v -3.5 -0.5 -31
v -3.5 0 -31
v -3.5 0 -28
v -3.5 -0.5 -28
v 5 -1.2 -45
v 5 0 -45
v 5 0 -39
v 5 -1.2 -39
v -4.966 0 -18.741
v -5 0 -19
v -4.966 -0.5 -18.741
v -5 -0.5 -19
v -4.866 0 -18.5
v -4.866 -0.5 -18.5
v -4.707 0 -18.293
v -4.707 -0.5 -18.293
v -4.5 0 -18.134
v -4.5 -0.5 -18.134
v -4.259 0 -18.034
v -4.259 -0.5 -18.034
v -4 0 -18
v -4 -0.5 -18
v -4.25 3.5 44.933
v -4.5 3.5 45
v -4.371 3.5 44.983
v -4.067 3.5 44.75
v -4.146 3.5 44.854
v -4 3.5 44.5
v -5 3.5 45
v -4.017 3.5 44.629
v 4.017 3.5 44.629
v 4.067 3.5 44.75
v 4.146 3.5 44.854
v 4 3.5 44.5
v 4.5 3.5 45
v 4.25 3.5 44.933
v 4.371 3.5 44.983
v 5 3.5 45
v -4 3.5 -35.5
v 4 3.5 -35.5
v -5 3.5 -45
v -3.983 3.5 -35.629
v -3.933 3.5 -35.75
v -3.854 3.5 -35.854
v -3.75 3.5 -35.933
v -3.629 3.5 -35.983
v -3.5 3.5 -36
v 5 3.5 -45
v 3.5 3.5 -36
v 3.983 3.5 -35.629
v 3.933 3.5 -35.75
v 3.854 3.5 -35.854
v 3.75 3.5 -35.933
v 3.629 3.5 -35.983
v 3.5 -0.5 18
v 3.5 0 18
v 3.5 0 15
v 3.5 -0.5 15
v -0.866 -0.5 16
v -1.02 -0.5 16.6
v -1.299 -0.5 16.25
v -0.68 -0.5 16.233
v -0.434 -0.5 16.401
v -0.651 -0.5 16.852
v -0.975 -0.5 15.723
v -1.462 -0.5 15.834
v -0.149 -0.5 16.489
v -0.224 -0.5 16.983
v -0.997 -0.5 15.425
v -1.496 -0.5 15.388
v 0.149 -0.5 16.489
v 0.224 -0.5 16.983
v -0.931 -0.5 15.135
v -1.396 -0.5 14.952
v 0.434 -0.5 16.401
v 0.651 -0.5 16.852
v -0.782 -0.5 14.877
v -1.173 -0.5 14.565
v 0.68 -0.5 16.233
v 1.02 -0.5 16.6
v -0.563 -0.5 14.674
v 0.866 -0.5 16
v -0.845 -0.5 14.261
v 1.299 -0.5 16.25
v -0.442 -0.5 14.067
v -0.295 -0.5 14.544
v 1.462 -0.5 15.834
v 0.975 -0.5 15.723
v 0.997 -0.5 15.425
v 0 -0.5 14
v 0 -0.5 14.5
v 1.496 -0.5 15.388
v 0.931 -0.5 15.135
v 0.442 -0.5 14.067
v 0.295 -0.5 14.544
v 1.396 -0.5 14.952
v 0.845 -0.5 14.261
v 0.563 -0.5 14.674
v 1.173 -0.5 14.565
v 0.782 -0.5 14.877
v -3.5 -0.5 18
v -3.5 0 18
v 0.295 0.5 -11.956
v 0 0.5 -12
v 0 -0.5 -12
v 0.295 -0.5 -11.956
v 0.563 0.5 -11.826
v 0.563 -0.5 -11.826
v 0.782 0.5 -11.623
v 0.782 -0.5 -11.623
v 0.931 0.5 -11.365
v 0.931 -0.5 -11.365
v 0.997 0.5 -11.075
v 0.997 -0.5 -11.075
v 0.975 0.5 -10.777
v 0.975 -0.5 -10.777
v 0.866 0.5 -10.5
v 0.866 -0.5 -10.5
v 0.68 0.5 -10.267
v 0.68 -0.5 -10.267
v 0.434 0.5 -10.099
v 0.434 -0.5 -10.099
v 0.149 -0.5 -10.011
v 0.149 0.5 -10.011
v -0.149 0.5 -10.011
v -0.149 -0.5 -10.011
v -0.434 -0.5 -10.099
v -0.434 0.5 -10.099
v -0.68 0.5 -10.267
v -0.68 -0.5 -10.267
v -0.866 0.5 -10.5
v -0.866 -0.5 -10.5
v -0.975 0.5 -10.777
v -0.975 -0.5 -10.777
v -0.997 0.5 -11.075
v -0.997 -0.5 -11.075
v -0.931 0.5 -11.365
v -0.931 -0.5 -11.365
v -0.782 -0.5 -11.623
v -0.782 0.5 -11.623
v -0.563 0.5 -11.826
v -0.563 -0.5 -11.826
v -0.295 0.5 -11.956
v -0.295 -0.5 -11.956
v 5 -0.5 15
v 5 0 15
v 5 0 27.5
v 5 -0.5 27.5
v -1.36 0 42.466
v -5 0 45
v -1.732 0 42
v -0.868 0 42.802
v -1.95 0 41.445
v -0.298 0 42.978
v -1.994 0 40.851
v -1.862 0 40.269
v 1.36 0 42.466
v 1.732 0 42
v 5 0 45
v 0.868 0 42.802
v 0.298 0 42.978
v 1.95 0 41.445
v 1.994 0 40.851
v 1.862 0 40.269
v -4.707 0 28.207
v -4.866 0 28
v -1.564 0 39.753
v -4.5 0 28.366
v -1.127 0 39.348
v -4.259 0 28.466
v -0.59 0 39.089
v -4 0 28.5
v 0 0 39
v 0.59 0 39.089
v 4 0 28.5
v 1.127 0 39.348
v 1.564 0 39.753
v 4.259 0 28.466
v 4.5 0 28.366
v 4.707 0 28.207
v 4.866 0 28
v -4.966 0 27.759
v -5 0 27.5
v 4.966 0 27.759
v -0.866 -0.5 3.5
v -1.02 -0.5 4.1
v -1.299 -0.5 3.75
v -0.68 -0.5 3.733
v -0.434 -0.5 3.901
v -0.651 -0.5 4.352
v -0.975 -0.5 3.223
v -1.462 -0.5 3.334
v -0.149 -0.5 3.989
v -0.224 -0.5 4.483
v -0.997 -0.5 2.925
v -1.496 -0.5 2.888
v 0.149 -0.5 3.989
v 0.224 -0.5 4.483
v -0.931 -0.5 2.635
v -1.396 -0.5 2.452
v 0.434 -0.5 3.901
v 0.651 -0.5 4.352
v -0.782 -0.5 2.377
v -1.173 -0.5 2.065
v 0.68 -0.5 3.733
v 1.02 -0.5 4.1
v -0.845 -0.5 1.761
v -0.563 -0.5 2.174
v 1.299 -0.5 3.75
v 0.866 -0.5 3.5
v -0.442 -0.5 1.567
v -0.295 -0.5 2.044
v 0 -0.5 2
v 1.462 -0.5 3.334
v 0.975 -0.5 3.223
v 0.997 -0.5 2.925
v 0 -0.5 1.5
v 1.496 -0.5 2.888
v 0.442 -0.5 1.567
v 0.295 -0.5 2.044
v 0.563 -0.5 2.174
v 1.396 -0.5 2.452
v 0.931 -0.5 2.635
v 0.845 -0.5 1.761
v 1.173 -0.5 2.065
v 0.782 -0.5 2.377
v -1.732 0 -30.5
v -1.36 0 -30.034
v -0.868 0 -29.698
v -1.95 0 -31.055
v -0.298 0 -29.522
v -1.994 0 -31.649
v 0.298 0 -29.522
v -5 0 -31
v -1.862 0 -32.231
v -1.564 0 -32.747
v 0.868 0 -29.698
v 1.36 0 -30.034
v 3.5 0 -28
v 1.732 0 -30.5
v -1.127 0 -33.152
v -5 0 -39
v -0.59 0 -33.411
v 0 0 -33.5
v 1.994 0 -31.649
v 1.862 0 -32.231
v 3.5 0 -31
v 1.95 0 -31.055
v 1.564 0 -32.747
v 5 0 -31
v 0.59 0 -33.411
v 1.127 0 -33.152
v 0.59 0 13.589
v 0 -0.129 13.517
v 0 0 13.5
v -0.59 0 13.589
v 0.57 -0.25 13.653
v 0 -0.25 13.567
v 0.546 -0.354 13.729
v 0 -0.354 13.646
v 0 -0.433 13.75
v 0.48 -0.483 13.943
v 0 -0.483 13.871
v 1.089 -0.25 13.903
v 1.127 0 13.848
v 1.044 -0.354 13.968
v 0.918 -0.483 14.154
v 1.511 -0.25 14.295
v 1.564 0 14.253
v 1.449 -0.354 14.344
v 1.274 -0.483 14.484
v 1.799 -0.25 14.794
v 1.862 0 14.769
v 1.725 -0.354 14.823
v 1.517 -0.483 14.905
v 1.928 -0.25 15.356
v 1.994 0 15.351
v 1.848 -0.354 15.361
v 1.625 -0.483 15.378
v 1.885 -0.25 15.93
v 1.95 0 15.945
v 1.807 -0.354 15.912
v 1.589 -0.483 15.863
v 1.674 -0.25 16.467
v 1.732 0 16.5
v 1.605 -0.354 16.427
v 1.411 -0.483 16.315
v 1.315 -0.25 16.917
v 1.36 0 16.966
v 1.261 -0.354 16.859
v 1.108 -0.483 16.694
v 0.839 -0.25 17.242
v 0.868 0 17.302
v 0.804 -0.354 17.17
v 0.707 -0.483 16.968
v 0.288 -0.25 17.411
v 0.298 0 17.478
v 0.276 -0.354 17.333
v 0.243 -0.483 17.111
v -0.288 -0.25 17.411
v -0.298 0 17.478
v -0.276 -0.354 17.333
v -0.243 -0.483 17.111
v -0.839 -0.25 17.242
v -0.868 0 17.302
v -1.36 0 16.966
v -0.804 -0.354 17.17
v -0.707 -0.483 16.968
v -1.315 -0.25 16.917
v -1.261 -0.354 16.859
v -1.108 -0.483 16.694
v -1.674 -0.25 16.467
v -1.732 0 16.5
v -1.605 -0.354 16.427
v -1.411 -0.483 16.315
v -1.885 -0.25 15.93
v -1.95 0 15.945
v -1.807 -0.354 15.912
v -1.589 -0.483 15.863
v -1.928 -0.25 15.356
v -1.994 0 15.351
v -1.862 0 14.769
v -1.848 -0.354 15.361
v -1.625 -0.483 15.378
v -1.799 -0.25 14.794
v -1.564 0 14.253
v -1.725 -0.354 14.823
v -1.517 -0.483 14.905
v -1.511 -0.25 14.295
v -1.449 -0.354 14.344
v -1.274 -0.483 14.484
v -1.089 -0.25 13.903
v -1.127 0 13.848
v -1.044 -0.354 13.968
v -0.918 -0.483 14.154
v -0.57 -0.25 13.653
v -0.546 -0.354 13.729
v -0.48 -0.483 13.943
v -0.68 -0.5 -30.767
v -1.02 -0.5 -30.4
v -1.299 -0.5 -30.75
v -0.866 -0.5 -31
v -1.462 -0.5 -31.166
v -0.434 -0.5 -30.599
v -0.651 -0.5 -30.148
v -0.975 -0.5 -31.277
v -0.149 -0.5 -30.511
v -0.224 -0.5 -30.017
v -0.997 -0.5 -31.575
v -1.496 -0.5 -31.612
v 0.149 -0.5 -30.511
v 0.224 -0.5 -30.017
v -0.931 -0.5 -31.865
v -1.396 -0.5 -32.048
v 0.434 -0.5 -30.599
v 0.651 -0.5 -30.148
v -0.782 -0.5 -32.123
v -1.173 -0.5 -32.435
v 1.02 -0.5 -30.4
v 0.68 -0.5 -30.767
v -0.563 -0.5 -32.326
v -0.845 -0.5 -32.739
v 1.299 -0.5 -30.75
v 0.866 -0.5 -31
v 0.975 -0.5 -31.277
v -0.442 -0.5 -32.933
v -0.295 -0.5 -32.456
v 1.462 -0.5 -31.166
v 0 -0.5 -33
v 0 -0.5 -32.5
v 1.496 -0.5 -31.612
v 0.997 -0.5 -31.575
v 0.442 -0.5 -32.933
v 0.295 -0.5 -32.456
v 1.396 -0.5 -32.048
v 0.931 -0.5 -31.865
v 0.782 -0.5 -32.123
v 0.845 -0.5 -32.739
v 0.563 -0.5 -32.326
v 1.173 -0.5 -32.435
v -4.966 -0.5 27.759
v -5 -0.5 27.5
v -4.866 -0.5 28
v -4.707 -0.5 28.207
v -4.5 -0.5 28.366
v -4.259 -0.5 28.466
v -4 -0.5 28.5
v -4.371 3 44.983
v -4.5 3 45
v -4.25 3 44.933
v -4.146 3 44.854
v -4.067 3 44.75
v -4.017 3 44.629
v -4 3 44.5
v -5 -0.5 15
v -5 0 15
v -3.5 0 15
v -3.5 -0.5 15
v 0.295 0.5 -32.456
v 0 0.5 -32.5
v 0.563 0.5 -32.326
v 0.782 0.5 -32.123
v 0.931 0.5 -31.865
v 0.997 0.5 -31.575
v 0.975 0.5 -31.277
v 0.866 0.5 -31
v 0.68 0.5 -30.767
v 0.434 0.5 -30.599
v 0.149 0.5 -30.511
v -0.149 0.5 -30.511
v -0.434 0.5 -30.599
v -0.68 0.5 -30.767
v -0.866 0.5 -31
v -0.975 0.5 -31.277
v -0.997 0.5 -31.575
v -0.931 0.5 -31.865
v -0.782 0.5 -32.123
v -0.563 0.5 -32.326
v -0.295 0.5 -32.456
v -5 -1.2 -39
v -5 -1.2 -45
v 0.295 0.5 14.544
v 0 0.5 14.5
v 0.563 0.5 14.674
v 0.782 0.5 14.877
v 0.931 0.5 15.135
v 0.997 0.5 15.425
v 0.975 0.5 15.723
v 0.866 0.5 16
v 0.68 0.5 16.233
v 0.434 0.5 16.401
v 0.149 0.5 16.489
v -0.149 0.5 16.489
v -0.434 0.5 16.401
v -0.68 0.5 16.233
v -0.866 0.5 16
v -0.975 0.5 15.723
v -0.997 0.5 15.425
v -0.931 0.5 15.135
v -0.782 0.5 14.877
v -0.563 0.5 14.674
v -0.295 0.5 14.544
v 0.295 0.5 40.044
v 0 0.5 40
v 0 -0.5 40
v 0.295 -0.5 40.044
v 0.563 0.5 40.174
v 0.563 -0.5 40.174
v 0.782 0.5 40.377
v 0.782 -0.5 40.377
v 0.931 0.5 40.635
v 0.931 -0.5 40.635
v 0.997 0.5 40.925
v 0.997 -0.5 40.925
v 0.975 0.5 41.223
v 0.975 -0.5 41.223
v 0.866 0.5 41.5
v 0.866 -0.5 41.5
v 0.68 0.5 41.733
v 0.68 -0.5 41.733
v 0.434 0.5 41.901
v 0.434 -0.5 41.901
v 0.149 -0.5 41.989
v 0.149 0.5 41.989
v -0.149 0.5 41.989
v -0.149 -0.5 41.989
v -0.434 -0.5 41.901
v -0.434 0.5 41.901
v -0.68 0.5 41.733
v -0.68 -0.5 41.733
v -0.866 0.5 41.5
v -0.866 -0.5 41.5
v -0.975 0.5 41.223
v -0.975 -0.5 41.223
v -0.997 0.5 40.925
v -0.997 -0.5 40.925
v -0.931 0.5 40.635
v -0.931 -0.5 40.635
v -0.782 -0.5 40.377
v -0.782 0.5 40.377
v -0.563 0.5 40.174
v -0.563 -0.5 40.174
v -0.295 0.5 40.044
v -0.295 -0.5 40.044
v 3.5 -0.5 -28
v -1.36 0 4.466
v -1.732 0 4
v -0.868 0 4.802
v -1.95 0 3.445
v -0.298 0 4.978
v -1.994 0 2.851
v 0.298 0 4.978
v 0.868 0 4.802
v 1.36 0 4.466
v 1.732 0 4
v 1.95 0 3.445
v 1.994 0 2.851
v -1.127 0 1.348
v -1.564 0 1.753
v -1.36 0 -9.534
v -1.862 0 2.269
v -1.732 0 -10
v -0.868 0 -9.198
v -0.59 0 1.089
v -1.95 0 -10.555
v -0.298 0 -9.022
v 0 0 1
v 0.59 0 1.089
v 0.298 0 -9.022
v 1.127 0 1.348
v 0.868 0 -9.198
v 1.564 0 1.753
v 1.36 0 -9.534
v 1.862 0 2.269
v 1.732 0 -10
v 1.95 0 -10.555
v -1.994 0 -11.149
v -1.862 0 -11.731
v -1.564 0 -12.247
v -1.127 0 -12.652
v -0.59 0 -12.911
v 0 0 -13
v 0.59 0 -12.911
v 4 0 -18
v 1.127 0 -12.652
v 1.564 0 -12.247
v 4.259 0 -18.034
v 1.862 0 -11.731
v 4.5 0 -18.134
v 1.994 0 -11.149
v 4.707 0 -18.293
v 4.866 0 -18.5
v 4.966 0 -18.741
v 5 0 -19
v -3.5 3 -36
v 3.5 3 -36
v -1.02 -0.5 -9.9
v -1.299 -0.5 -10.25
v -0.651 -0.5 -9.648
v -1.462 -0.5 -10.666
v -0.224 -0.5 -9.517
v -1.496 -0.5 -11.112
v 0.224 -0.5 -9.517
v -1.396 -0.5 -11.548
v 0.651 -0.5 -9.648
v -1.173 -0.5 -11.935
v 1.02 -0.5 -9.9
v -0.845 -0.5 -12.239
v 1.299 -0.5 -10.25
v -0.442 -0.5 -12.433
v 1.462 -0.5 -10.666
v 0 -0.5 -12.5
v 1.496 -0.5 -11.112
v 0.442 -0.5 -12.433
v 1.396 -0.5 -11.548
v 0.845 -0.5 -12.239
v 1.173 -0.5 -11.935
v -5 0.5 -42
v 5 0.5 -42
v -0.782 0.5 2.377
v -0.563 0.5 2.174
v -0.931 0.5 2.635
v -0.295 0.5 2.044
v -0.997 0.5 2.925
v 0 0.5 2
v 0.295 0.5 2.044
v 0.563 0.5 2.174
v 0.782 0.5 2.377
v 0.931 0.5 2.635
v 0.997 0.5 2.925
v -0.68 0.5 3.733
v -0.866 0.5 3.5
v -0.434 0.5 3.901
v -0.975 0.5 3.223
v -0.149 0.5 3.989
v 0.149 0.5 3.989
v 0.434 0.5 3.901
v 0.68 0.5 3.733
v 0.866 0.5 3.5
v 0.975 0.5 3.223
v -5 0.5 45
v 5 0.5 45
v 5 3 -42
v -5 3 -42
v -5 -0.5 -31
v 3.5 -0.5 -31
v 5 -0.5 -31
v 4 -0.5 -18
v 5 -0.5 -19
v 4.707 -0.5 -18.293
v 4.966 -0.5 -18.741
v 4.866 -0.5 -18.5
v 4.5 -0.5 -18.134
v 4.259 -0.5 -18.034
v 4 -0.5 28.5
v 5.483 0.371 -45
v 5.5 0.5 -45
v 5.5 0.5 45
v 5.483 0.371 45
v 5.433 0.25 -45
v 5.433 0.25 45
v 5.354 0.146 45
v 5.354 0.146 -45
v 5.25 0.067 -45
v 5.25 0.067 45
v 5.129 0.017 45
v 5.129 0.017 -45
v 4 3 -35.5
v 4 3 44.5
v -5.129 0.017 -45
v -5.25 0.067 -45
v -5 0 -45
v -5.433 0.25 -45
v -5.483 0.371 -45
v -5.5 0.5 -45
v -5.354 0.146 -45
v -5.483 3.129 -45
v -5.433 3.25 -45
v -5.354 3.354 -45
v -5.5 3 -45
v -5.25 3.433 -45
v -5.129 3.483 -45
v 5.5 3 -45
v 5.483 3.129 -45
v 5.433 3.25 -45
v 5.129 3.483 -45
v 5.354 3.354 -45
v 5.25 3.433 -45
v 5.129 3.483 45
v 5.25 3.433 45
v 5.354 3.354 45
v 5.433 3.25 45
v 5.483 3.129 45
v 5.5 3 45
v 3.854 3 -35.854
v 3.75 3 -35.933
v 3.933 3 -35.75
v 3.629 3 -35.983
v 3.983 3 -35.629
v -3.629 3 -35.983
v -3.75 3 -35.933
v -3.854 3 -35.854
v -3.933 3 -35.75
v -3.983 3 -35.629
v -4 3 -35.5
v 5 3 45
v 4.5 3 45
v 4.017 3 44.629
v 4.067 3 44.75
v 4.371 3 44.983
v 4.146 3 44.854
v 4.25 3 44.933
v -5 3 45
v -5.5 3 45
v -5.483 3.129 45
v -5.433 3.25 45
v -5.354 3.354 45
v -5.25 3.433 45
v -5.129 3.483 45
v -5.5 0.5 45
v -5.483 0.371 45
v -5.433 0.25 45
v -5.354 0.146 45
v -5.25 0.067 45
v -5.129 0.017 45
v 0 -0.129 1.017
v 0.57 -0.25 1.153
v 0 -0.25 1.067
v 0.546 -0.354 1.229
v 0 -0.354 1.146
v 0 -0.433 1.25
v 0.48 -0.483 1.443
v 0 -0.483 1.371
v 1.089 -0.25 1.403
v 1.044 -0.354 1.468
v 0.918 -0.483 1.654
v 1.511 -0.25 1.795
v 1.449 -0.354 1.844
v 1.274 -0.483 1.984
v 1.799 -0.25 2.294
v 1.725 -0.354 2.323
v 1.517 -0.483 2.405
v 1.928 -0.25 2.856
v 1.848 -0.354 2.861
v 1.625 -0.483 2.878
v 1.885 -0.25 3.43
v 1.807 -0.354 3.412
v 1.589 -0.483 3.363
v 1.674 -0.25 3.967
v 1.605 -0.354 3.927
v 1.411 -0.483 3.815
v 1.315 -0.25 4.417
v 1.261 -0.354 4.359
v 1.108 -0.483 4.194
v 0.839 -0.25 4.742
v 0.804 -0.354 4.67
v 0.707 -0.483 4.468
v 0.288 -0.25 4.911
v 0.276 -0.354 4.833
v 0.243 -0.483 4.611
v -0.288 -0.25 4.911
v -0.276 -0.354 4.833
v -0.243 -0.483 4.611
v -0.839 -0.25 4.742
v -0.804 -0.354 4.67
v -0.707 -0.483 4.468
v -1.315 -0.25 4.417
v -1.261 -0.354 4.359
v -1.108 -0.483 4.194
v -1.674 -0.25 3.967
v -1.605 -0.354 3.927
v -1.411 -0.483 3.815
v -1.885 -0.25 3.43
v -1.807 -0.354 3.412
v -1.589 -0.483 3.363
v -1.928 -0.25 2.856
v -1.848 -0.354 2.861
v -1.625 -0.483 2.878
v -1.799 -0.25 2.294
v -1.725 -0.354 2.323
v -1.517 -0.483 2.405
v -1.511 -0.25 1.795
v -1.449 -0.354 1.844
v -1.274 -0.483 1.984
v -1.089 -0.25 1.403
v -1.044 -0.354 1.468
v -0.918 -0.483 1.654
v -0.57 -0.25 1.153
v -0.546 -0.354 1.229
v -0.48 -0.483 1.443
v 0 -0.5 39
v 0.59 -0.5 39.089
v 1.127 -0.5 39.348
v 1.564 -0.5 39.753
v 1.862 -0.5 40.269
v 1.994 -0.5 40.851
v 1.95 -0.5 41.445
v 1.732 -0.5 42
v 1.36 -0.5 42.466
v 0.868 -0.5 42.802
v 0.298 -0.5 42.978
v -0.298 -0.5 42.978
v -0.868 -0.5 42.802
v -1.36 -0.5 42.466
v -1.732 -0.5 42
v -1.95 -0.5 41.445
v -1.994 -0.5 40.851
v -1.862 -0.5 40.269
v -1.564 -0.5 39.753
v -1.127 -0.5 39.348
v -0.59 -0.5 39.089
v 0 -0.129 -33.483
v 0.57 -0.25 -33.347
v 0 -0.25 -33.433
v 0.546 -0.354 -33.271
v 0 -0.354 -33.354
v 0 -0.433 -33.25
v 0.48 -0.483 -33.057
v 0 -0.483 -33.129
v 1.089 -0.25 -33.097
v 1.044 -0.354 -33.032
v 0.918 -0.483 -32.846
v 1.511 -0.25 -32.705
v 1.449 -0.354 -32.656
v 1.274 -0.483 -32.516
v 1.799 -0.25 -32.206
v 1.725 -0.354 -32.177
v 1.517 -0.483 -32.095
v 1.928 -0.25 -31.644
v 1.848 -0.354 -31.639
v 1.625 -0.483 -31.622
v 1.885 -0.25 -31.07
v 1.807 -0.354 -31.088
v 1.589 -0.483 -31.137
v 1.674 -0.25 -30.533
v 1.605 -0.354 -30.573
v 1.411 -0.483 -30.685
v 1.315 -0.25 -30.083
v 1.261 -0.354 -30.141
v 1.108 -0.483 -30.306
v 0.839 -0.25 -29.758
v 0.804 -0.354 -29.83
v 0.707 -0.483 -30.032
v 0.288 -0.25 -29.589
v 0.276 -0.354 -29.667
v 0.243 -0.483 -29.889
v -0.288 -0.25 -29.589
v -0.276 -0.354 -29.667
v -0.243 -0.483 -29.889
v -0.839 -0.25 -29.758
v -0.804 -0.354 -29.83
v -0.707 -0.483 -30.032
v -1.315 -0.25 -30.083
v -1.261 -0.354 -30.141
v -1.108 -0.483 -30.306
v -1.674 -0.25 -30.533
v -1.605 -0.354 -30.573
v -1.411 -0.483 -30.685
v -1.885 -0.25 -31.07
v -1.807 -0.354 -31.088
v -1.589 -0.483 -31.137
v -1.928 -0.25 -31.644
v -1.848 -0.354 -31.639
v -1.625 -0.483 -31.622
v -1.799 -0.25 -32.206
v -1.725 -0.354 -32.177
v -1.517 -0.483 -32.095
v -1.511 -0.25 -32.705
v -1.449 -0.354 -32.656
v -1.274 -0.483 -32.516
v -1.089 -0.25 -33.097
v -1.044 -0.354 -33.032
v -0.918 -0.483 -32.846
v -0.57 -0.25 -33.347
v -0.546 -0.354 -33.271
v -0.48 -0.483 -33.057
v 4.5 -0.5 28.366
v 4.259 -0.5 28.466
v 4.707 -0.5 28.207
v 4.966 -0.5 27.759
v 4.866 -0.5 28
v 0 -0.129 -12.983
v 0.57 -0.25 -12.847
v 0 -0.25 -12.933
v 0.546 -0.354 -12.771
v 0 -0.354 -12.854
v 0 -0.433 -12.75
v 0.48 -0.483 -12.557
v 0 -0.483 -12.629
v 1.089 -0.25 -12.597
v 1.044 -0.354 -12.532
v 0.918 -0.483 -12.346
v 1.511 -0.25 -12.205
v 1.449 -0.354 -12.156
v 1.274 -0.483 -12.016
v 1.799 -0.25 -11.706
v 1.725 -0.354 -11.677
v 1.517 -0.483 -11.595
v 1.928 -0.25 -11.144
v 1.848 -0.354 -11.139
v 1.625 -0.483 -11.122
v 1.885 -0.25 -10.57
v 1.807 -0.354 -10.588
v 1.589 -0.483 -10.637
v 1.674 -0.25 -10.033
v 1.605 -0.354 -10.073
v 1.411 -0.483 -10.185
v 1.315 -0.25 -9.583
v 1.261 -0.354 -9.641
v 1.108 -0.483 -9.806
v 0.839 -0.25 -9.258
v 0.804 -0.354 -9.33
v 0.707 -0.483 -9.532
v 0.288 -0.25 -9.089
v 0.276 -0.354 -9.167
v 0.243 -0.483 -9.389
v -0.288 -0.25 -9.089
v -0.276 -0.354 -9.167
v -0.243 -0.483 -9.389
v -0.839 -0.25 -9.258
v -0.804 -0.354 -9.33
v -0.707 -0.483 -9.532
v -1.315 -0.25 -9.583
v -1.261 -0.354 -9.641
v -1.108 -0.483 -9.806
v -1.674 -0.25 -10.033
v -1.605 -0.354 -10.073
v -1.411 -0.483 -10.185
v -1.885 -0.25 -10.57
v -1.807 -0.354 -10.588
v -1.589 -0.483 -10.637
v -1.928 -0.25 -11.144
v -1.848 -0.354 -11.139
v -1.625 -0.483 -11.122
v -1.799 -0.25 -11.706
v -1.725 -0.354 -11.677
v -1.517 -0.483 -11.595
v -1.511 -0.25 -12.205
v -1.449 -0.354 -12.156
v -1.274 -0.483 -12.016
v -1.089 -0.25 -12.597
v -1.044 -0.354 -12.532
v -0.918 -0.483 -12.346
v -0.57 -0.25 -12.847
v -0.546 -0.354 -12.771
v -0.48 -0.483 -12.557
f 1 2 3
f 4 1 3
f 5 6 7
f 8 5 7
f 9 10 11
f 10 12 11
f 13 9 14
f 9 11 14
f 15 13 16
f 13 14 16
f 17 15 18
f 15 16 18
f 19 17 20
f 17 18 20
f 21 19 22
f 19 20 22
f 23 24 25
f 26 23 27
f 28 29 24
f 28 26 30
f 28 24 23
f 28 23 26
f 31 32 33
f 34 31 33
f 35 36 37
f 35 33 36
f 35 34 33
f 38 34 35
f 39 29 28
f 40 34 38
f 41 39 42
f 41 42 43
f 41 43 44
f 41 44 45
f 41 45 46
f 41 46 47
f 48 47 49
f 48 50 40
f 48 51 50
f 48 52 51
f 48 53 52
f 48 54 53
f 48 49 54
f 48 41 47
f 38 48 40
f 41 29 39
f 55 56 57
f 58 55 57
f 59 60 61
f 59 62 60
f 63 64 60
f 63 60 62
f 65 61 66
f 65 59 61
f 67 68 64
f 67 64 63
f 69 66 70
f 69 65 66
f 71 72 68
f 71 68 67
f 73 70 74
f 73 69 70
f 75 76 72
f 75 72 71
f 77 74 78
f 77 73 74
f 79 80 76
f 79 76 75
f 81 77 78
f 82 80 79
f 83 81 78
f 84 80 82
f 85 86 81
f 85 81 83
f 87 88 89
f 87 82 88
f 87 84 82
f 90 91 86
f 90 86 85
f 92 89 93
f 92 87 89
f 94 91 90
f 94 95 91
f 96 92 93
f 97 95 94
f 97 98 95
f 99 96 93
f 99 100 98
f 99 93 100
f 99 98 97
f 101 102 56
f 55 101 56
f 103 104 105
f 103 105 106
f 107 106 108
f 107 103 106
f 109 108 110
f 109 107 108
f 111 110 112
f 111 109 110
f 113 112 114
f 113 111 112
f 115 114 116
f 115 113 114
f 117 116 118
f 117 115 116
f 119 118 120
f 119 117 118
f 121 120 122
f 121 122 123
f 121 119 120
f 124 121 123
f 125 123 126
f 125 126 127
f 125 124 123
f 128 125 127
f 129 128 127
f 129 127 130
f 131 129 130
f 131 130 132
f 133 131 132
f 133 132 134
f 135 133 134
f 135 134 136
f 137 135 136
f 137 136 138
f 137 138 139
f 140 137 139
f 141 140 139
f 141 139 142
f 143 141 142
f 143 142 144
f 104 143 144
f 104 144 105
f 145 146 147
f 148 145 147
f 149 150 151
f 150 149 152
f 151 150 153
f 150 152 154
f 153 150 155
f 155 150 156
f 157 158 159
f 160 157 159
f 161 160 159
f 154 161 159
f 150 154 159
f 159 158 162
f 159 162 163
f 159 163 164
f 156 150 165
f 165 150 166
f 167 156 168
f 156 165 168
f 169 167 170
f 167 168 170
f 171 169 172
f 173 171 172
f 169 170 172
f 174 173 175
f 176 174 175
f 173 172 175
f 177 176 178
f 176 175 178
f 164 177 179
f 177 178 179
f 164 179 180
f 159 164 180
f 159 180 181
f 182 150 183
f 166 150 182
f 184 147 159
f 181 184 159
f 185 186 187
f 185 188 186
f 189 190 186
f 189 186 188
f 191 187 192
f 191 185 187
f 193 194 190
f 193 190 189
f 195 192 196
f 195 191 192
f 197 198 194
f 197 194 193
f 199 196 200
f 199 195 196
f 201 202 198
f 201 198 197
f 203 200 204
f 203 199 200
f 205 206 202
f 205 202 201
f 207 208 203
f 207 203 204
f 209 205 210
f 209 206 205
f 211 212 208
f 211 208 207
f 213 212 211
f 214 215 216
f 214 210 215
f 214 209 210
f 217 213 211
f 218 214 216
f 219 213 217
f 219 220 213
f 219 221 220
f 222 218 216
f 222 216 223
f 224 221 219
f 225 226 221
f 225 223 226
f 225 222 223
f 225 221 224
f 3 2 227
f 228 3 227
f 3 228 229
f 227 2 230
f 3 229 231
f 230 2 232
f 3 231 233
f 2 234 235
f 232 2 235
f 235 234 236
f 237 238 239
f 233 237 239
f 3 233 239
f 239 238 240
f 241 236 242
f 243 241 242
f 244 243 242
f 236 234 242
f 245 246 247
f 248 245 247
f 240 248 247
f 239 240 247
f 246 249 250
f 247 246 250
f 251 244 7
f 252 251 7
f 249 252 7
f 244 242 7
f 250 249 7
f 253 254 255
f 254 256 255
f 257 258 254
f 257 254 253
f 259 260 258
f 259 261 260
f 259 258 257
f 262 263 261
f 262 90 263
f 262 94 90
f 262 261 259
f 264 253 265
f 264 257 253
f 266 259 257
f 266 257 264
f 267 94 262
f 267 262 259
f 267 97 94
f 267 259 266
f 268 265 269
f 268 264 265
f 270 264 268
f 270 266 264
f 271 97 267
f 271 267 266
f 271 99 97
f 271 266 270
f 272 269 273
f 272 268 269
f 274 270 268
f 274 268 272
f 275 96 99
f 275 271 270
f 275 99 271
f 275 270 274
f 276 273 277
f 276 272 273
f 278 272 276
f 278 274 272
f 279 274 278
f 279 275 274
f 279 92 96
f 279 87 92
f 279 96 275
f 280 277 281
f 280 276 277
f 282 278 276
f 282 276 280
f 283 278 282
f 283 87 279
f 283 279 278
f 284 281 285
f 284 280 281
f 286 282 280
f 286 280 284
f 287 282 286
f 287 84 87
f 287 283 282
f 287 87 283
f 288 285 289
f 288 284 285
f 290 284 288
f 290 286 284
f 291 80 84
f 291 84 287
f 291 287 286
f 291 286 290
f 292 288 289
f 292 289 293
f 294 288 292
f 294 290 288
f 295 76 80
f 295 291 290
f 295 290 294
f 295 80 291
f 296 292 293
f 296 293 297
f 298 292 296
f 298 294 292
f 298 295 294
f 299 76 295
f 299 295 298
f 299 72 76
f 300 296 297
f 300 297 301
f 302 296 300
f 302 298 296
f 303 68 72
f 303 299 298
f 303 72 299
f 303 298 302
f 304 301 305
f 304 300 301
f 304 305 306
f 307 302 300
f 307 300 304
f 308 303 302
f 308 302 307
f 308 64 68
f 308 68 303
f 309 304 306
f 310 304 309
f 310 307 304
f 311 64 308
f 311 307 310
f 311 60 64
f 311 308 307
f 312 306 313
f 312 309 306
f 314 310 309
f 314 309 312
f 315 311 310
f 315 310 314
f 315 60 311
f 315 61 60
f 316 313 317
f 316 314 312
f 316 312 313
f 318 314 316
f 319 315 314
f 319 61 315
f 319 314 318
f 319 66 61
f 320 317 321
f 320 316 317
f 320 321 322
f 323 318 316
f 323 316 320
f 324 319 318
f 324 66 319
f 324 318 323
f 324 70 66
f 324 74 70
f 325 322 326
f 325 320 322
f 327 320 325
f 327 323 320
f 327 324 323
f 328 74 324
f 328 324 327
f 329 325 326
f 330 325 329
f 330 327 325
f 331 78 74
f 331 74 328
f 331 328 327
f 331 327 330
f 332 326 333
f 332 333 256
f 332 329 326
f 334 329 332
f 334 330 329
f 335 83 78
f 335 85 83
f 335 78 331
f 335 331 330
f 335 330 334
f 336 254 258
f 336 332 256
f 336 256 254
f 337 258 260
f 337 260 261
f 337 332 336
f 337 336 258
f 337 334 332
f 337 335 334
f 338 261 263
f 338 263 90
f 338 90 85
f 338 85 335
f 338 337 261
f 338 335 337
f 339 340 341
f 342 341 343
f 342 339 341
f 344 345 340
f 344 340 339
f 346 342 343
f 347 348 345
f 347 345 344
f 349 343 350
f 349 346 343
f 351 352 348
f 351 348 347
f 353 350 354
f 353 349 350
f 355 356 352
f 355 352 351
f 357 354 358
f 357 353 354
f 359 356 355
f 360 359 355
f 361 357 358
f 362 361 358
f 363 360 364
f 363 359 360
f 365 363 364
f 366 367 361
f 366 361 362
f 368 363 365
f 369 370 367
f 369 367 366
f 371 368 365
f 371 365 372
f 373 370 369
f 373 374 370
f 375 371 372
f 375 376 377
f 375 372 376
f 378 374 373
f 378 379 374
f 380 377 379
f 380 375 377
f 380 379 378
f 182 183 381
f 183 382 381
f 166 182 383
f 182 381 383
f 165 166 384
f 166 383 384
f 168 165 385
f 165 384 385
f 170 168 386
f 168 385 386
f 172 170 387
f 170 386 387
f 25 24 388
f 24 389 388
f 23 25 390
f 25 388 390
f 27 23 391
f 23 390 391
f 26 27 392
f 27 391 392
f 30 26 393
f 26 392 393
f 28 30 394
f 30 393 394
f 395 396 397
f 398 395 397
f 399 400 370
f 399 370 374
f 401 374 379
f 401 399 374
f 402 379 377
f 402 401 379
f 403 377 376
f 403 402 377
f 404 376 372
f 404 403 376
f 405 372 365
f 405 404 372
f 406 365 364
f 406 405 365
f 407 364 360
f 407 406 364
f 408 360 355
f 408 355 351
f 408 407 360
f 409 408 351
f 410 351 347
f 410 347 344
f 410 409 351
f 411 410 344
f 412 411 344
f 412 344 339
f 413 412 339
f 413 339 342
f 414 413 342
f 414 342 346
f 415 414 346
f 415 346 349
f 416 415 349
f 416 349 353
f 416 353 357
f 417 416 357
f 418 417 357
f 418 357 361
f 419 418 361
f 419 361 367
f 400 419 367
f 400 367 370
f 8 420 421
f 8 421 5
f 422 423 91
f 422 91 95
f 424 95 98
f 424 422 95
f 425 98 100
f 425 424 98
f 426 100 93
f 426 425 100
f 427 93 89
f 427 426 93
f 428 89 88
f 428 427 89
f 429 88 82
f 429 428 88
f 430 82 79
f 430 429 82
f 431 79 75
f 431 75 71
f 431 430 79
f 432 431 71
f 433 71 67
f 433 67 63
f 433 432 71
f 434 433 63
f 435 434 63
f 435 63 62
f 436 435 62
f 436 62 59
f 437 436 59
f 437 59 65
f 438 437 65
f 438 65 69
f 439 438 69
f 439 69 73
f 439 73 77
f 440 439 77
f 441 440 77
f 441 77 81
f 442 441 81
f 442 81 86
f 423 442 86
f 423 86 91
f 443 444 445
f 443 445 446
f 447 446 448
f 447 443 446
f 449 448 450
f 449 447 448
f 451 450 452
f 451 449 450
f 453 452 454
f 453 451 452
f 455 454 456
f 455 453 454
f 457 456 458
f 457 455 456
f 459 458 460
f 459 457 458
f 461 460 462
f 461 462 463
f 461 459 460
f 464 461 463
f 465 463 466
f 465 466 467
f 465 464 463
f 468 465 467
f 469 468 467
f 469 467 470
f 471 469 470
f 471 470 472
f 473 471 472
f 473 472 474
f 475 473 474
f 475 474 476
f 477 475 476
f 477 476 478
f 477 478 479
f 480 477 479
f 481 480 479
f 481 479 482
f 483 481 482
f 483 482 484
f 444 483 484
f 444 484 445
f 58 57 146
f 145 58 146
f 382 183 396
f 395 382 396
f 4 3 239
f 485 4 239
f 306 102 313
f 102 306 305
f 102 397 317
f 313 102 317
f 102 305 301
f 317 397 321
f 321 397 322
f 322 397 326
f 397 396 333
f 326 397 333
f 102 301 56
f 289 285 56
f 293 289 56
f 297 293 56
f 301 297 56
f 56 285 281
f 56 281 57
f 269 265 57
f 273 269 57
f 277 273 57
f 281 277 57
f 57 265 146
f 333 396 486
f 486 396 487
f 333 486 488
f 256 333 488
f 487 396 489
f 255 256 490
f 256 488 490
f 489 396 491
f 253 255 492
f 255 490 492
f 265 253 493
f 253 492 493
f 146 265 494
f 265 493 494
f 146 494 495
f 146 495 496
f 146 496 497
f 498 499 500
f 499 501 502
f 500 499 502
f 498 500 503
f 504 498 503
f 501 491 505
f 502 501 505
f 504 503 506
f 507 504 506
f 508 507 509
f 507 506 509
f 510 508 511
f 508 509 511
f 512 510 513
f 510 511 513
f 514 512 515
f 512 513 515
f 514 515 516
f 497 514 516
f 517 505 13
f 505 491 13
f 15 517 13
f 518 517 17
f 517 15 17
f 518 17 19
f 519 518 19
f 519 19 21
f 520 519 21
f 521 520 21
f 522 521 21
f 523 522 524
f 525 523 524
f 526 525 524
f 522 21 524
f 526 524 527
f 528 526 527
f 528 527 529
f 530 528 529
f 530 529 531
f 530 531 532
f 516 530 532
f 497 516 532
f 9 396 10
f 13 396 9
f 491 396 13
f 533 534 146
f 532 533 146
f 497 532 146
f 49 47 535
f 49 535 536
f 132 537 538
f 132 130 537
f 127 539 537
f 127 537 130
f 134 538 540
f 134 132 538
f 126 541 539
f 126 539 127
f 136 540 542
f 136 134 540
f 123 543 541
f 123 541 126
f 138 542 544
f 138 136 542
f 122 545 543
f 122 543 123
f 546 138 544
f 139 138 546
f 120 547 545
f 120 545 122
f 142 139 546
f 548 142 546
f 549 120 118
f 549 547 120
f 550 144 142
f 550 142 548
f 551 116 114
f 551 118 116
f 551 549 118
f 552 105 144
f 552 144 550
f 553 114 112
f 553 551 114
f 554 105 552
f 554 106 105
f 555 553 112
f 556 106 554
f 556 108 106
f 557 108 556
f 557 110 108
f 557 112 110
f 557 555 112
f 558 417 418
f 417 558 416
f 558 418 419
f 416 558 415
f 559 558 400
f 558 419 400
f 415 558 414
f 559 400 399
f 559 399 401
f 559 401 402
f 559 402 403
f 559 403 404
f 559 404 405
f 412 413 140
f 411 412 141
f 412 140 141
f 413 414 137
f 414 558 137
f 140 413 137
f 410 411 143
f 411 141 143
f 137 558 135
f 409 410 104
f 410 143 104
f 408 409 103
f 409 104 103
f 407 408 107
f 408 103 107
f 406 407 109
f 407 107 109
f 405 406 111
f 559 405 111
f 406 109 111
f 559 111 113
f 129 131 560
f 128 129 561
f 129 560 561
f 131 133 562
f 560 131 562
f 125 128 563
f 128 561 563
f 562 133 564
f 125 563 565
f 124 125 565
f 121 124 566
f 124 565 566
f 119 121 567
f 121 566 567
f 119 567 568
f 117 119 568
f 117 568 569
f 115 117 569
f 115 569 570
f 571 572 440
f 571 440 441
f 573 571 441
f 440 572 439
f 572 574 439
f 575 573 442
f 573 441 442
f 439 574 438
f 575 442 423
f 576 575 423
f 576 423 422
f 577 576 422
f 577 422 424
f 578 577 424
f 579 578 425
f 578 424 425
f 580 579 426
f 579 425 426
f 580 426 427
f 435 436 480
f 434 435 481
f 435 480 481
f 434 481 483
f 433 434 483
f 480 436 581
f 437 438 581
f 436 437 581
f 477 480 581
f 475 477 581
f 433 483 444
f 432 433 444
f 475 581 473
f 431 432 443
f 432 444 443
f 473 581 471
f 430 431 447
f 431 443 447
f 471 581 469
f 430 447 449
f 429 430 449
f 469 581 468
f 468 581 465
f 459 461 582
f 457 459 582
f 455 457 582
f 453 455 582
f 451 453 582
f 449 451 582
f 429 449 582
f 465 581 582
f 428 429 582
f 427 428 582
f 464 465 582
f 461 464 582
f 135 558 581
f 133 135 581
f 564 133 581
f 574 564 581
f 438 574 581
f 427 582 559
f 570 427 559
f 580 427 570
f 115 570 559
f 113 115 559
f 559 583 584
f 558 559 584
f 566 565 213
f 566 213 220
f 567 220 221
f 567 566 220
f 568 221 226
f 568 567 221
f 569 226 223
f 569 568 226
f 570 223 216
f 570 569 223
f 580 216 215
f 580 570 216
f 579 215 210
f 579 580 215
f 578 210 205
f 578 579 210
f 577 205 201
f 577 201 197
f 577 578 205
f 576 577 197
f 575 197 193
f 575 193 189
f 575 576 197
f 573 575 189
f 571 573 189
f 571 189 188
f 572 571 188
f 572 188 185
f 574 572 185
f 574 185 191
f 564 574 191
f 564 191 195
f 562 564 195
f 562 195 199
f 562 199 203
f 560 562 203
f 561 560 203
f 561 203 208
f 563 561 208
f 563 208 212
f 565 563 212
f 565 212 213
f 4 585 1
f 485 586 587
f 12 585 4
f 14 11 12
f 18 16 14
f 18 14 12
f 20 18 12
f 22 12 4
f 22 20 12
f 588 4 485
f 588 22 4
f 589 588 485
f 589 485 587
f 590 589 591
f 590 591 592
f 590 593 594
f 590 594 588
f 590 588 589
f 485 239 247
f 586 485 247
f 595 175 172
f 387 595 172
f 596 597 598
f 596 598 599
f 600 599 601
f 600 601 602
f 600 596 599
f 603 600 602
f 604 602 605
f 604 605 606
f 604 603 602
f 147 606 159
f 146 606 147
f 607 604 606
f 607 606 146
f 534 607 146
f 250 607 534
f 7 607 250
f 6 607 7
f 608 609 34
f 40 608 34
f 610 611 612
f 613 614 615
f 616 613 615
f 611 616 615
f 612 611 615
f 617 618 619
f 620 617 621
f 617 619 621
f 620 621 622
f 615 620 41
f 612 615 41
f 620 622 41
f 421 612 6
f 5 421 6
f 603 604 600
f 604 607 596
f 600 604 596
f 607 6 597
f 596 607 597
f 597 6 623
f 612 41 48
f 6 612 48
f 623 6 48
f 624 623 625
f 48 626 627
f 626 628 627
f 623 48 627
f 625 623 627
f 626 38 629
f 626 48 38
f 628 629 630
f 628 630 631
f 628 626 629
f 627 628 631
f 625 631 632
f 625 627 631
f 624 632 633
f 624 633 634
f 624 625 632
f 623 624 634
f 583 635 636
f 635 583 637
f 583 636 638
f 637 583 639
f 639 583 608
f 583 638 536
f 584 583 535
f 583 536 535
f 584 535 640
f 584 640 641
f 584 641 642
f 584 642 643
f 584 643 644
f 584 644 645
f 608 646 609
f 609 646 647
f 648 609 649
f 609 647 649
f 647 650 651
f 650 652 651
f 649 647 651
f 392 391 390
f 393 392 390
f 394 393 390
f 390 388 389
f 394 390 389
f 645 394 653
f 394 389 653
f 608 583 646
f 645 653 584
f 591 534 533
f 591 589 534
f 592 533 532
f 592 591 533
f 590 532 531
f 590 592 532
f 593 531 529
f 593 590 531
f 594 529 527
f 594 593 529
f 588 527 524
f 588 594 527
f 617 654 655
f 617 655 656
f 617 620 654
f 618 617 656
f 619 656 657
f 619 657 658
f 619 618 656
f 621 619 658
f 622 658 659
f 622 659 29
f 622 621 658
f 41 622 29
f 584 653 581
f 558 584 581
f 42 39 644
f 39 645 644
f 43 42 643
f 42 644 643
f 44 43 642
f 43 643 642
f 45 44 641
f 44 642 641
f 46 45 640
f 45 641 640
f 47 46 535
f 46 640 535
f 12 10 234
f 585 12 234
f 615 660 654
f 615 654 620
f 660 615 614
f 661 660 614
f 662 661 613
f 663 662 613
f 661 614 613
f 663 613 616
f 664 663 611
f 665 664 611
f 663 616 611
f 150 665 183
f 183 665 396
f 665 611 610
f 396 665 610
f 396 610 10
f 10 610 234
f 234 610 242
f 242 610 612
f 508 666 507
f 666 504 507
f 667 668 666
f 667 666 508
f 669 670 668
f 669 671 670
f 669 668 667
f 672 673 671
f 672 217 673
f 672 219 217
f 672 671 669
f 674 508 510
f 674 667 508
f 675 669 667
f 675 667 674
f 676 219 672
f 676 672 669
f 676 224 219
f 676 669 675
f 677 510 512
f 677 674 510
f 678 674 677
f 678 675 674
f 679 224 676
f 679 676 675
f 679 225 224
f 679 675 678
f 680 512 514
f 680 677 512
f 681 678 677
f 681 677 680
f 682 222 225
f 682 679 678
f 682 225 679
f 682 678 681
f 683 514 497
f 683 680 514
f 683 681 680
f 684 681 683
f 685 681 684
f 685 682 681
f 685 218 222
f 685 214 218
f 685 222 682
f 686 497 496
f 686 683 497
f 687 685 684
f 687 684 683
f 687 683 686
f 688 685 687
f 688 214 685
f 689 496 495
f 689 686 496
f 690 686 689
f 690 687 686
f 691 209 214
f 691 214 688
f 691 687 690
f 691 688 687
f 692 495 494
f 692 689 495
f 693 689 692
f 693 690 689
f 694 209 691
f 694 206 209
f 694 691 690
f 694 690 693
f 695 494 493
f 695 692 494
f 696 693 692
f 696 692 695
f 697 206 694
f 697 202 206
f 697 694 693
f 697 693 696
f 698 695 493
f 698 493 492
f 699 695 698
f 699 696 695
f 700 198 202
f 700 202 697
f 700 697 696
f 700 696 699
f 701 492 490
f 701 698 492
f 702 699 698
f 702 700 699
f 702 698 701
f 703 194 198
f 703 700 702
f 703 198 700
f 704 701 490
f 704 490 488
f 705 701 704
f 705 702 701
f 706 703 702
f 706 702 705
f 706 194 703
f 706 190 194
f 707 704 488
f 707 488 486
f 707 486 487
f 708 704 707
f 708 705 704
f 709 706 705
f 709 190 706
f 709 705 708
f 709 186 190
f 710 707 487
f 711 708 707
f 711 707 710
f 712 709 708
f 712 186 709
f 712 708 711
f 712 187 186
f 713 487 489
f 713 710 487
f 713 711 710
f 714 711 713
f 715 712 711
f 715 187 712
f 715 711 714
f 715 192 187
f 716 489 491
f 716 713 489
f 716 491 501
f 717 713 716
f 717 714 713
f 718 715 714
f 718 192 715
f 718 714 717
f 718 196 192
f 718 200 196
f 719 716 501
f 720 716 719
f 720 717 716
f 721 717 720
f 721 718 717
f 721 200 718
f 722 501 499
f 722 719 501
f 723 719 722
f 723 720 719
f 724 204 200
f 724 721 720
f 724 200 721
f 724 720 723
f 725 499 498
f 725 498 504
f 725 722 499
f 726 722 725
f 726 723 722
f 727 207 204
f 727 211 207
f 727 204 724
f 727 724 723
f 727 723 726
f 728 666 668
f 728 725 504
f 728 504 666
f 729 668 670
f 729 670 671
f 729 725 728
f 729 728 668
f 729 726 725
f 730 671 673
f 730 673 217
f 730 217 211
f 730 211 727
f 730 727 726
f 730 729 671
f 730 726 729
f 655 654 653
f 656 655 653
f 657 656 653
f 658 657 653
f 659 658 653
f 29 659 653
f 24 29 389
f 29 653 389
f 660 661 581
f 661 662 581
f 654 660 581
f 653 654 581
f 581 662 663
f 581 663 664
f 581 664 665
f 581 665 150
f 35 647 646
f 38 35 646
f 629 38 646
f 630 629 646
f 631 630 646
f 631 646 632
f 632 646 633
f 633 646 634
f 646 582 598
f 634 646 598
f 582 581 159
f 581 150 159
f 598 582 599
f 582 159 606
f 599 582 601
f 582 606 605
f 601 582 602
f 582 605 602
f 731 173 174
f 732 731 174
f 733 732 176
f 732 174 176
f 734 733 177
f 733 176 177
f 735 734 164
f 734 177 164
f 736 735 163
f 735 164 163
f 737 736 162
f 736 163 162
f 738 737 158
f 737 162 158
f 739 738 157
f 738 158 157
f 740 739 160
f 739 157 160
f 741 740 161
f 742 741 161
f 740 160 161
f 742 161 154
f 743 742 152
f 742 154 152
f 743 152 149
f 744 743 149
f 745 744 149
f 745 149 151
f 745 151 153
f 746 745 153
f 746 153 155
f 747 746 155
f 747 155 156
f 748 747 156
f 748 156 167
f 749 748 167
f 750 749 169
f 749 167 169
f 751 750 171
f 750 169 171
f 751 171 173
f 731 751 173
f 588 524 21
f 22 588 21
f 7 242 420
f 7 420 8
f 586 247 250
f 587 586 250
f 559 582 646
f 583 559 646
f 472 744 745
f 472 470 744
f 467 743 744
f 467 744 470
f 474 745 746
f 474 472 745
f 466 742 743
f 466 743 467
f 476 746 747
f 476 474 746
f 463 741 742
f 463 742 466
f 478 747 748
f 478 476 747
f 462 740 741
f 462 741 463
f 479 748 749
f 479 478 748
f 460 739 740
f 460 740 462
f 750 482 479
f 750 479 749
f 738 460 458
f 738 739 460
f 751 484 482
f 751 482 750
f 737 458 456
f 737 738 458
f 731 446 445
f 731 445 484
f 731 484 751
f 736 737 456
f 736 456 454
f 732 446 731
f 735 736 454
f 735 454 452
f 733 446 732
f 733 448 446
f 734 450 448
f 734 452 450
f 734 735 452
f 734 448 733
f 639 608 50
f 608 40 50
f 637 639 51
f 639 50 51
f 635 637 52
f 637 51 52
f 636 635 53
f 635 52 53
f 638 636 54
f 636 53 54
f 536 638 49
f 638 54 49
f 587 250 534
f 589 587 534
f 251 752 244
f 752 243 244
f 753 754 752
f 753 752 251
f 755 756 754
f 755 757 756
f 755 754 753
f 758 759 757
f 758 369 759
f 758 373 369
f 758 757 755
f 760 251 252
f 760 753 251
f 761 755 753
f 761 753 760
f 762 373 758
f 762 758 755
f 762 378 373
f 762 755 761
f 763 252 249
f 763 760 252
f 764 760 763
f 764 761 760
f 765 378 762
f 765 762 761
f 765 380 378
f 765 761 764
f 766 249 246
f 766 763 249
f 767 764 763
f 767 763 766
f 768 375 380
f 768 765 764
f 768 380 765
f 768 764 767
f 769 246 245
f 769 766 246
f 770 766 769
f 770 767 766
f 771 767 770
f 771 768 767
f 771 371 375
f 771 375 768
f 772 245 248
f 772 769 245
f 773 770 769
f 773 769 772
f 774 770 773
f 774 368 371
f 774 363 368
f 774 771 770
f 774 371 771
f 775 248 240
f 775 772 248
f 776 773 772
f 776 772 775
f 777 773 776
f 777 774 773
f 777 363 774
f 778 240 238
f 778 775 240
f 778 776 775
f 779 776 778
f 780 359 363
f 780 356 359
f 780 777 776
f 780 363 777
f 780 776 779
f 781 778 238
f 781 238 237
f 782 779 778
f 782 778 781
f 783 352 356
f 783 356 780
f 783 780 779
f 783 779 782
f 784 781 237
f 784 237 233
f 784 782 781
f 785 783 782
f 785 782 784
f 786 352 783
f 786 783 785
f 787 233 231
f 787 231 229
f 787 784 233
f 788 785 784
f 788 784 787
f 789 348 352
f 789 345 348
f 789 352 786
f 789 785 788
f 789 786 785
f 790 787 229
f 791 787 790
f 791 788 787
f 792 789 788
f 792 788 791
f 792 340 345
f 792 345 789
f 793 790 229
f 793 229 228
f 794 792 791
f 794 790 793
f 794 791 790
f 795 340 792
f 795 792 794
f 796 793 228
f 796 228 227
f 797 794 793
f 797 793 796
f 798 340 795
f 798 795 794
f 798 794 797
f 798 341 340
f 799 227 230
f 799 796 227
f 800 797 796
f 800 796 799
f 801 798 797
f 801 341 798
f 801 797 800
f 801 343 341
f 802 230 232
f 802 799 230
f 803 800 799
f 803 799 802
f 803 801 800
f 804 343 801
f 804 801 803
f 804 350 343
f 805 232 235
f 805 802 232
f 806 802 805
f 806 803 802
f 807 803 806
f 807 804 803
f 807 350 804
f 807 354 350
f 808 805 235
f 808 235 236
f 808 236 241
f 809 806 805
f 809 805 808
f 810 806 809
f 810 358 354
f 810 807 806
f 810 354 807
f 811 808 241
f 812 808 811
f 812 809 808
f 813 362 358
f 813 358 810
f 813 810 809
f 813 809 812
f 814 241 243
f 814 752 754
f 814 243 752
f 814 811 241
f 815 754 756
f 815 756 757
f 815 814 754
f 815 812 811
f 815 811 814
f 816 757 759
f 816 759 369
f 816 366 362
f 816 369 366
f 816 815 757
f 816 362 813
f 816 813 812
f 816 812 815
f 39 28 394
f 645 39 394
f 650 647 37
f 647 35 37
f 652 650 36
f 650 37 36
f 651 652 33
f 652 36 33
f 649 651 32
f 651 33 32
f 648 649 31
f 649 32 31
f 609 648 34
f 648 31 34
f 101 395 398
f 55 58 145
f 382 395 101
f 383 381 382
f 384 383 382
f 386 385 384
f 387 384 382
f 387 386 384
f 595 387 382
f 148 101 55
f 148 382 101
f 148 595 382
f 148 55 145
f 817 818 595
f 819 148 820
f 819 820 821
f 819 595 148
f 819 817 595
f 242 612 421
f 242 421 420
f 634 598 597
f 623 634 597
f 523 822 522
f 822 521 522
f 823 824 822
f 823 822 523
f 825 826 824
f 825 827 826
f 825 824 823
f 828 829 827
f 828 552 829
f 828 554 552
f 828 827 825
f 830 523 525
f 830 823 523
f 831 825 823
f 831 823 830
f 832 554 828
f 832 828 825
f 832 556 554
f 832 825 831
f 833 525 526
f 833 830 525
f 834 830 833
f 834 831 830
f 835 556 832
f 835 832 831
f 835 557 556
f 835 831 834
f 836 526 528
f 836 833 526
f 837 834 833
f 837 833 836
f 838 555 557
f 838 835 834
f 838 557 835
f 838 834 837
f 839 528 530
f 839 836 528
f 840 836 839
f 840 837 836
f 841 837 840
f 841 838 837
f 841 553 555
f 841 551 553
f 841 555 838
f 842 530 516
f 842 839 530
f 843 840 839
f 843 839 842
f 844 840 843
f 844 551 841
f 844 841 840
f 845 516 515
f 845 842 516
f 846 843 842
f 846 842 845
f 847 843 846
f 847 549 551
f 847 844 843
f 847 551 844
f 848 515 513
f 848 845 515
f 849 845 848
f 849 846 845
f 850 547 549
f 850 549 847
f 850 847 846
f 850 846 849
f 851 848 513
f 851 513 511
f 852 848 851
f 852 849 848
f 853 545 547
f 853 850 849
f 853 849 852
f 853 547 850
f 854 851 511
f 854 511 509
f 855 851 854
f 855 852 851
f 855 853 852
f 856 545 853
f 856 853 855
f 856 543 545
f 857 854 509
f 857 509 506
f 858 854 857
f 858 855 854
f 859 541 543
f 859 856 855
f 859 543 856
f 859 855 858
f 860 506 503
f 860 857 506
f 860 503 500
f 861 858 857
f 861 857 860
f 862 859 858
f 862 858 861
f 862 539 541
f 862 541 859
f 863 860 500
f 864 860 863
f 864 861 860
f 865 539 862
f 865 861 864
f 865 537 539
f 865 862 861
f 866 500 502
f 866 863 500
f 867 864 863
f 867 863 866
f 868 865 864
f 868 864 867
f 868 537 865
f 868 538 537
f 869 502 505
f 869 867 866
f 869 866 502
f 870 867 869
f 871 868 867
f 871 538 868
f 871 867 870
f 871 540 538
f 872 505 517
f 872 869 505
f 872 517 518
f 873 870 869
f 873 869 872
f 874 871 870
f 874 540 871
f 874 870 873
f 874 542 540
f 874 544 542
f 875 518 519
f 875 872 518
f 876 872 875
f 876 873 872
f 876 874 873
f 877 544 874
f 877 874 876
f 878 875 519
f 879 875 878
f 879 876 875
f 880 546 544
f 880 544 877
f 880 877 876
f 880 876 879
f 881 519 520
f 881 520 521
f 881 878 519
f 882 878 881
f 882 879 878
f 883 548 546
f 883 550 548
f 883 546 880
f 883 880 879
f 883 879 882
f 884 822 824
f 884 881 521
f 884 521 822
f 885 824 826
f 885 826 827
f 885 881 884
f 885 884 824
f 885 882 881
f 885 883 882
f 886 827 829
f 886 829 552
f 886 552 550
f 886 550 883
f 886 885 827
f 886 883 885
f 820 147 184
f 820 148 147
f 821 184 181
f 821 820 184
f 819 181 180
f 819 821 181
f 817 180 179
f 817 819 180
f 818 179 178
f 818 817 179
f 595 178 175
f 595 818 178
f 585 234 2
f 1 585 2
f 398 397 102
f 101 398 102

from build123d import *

# Parameters (mm, degrees)
SKETCH1_W           = 11
SKETCH1_H           = 90
BOSS_EXTRUDE1_DEPTH = 3.5
CUT_EXTRUDE1_DEPTH  = 81
CUT_EXTRUDE2_DEPTH  = 6
FILLET1_R           = 0.5
FILLET2_R           = 0.5
SKETCH4_R           = 2
SKETCH4_R_2         = 1
BOSS_EXTRUDE2_DEPTH = 0.5
CUT_EXTRUDE3_START  = -1
SKETCH4_2_R         = 1
CUT_EXTRUDE3_DEPTH  = 1
FILLET3_R           = 0.5
FILLET4_R           = 1
SKETCH5_W           = 10
SKETCH5_H           = 6
BOSS_EXTRUDE3_DEPTH = 1.2


with BuildPart() as part:
    # Sketch1 → Boss-Extrude1 (new body)
    with BuildSketch(Plane(origin=(0, 0, 0), x_dir=(1, 0, 0), z_dir=(0, 1, 0))):
        Rectangle(SKETCH1_W, SKETCH1_H)
    extrude(amount=BOSS_EXTRUDE1_DEPTH)

    # Sketch2 → Cut-Extrude1 (cut)
    with BuildSketch(Plane.XY.offset(45)):
        Polygon((-4, 3.5), (-4, 3), (-5, 3), (-5, 0.5), (5, 0.5), (5, 3), (4, 3), (4, 3.5), align=None)
    extrude(amount=-CUT_EXTRUDE1_DEPTH, mode=Mode.SUBTRACT)

    # Sketch3 → Cut-Extrude2 (cut)
    with BuildSketch(Plane.XY.offset(-36)):
        Polygon((-4, 3), (4, 3), (5, 3), (5, 0.5), (-5, 0.5), (-5, 3), align=None)
    extrude(amount=-CUT_EXTRUDE2_DEPTH, mode=Mode.SUBTRACT)

    # Fillet1
    fillet1_edges = [part.edges().sort_by_distance(p)[0] for p in [
        (-5.5, 3.5, 0),
        (5.5, 3.5, 0),
        (-5.5, 0, 0),
        (5.5, 0, 0),
    ]]
    fillet(fillet1_edges, radius=FILLET1_R)

    # Fillet2
    fillet2_edges = [part.edges().sort_by_distance(p)[0] for p in [
        (4, 3.25, -36),
        (-4, 3.25, -36),
        (-4, 3.25, 45),
        (4, 3.25, 45),
    ]]
    fillet(fillet2_edges, radius=FILLET2_R)

    # Sketch4 → Boss-Extrude2 (add)
    # profile 1 of 7: a face of its own
    with BuildSketch(Plane.XZ):
        with Locations(Location((0, -31.5, 0), (0, 0, 270))):
            Circle(SKETCH4_R)
        with Locations(Location((0, -31.5, 0), (0, 0, 270))):
            Circle(SKETCH4_R_2, mode=Mode.SUBTRACT)
    # profile 2 of 7: a face of its own
    with BuildSketch(Plane.XZ):
        with Locations(Location((0, -11, 0), (0, 0, 270))):
            Circle(SKETCH4_R)
        with Locations(Location((0, -11, 0), (0, 0, 270))):
            Circle(SKETCH4_R_2, mode=Mode.SUBTRACT)
    # profile 3 of 7: a face of its own
    with BuildSketch(Plane.XZ):
        with Locations(Location((0, 3, 0), (0, 0, 270))):
            Circle(SKETCH4_R)
        with Locations(Location((0, 3, 0), (0, 0, 270))):
            Circle(SKETCH4_R_2, mode=Mode.SUBTRACT)
    # profile 4 of 7: a face of its own
    with BuildSketch(Plane.XZ):
        with Locations(Location((0, 41, 0), (0, 0, 270))):
            Circle(SKETCH4_R)
        with Locations(Location((0, 41, 0), (0, 0, 270))):
            Circle(SKETCH4_R_2, mode=Mode.SUBTRACT)
    # profile 5 of 7: a face of its own
    with BuildSketch(Plane.XZ):
        with Locations(Location((0, 15.5, 0), (0, 0, 270))):
            Circle(SKETCH4_R)
        with Locations(Location((0, 15.5, 0), (0, 0, 270))):
            Circle(SKETCH4_R_2, mode=Mode.SUBTRACT)
    # profile 6 of 7: a face of its own
    with BuildSketch(Plane.XZ):
        Polygon((5, 28.5), (-5, 28.5), (-5, 15), (-3.5, 15), (-3.5, 18), (3.5, 18), (3.5, 15), (5, 15), align=None)
    # profile 7 of 7: a face of its own
    with BuildSketch(Plane.XZ):
        Polygon((5, -18), (-5, -18), (-5, -31), (-3.5, -31), (-3.5, -28), (3.5, -28), (3.5, -31), (5, -31), align=None)
    extrude(amount=BOSS_EXTRUDE2_DEPTH)

    # Sketch4<2> → Cut-Extrude3 (cut)
    with BuildSketch(Plane.XZ.offset(CUT_EXTRUDE3_START)):
        with Locations(Location((0, -31.5, 0), (0, 0, 270))):
            Circle(SKETCH4_2_R)
        with Locations(Location((0, -11, 0), (0, 0, 270))):
            Circle(SKETCH4_2_R)
        with Locations(Location((0, 3, 0), (0, 0, 270))):
            Circle(SKETCH4_2_R)
        with Locations(Location((0, 15.5, 0), (0, 0, 270))):
            Circle(SKETCH4_2_R)
        with Locations(Location((0, 41, 0), (0, 0, 270))):
            Circle(SKETCH4_2_R)
    extrude(amount=CUT_EXTRUDE3_DEPTH, mode=Mode.SUBTRACT)

    # Fillet3
    fillet3_edges = [part.edges().sort_by_distance(p)[0] for p in [
        (0, -0.5, -29.5),
        (0, -0.5, -9),
        (0, -0.5, 5),
        (0, -0.5, 17.5),
    ]]
    fillet(fillet3_edges, radius=FILLET3_R - 0.0001)  # a hair under: the kernel refuses the full size

    # Fillet4
    fillet4_edges = [part.edges().sort_by_distance(p)[0] for p in [
        (5, -0.25, 28.5),
        (-5, -0.25, 28.5),
        (5, -0.25, -18),
        (-5, -0.25, -18),
    ]]
    fillet(fillet4_edges, radius=FILLET4_R)

    # Sketch5 → Boss-Extrude3 (add)
    with BuildSketch(Plane.XZ):
        with Locations((0, -42)):
            Rectangle(SKETCH5_W, SKETCH5_H)
    extrude(amount=BOSS_EXTRUDE3_DEPTH)


solid = part.part
